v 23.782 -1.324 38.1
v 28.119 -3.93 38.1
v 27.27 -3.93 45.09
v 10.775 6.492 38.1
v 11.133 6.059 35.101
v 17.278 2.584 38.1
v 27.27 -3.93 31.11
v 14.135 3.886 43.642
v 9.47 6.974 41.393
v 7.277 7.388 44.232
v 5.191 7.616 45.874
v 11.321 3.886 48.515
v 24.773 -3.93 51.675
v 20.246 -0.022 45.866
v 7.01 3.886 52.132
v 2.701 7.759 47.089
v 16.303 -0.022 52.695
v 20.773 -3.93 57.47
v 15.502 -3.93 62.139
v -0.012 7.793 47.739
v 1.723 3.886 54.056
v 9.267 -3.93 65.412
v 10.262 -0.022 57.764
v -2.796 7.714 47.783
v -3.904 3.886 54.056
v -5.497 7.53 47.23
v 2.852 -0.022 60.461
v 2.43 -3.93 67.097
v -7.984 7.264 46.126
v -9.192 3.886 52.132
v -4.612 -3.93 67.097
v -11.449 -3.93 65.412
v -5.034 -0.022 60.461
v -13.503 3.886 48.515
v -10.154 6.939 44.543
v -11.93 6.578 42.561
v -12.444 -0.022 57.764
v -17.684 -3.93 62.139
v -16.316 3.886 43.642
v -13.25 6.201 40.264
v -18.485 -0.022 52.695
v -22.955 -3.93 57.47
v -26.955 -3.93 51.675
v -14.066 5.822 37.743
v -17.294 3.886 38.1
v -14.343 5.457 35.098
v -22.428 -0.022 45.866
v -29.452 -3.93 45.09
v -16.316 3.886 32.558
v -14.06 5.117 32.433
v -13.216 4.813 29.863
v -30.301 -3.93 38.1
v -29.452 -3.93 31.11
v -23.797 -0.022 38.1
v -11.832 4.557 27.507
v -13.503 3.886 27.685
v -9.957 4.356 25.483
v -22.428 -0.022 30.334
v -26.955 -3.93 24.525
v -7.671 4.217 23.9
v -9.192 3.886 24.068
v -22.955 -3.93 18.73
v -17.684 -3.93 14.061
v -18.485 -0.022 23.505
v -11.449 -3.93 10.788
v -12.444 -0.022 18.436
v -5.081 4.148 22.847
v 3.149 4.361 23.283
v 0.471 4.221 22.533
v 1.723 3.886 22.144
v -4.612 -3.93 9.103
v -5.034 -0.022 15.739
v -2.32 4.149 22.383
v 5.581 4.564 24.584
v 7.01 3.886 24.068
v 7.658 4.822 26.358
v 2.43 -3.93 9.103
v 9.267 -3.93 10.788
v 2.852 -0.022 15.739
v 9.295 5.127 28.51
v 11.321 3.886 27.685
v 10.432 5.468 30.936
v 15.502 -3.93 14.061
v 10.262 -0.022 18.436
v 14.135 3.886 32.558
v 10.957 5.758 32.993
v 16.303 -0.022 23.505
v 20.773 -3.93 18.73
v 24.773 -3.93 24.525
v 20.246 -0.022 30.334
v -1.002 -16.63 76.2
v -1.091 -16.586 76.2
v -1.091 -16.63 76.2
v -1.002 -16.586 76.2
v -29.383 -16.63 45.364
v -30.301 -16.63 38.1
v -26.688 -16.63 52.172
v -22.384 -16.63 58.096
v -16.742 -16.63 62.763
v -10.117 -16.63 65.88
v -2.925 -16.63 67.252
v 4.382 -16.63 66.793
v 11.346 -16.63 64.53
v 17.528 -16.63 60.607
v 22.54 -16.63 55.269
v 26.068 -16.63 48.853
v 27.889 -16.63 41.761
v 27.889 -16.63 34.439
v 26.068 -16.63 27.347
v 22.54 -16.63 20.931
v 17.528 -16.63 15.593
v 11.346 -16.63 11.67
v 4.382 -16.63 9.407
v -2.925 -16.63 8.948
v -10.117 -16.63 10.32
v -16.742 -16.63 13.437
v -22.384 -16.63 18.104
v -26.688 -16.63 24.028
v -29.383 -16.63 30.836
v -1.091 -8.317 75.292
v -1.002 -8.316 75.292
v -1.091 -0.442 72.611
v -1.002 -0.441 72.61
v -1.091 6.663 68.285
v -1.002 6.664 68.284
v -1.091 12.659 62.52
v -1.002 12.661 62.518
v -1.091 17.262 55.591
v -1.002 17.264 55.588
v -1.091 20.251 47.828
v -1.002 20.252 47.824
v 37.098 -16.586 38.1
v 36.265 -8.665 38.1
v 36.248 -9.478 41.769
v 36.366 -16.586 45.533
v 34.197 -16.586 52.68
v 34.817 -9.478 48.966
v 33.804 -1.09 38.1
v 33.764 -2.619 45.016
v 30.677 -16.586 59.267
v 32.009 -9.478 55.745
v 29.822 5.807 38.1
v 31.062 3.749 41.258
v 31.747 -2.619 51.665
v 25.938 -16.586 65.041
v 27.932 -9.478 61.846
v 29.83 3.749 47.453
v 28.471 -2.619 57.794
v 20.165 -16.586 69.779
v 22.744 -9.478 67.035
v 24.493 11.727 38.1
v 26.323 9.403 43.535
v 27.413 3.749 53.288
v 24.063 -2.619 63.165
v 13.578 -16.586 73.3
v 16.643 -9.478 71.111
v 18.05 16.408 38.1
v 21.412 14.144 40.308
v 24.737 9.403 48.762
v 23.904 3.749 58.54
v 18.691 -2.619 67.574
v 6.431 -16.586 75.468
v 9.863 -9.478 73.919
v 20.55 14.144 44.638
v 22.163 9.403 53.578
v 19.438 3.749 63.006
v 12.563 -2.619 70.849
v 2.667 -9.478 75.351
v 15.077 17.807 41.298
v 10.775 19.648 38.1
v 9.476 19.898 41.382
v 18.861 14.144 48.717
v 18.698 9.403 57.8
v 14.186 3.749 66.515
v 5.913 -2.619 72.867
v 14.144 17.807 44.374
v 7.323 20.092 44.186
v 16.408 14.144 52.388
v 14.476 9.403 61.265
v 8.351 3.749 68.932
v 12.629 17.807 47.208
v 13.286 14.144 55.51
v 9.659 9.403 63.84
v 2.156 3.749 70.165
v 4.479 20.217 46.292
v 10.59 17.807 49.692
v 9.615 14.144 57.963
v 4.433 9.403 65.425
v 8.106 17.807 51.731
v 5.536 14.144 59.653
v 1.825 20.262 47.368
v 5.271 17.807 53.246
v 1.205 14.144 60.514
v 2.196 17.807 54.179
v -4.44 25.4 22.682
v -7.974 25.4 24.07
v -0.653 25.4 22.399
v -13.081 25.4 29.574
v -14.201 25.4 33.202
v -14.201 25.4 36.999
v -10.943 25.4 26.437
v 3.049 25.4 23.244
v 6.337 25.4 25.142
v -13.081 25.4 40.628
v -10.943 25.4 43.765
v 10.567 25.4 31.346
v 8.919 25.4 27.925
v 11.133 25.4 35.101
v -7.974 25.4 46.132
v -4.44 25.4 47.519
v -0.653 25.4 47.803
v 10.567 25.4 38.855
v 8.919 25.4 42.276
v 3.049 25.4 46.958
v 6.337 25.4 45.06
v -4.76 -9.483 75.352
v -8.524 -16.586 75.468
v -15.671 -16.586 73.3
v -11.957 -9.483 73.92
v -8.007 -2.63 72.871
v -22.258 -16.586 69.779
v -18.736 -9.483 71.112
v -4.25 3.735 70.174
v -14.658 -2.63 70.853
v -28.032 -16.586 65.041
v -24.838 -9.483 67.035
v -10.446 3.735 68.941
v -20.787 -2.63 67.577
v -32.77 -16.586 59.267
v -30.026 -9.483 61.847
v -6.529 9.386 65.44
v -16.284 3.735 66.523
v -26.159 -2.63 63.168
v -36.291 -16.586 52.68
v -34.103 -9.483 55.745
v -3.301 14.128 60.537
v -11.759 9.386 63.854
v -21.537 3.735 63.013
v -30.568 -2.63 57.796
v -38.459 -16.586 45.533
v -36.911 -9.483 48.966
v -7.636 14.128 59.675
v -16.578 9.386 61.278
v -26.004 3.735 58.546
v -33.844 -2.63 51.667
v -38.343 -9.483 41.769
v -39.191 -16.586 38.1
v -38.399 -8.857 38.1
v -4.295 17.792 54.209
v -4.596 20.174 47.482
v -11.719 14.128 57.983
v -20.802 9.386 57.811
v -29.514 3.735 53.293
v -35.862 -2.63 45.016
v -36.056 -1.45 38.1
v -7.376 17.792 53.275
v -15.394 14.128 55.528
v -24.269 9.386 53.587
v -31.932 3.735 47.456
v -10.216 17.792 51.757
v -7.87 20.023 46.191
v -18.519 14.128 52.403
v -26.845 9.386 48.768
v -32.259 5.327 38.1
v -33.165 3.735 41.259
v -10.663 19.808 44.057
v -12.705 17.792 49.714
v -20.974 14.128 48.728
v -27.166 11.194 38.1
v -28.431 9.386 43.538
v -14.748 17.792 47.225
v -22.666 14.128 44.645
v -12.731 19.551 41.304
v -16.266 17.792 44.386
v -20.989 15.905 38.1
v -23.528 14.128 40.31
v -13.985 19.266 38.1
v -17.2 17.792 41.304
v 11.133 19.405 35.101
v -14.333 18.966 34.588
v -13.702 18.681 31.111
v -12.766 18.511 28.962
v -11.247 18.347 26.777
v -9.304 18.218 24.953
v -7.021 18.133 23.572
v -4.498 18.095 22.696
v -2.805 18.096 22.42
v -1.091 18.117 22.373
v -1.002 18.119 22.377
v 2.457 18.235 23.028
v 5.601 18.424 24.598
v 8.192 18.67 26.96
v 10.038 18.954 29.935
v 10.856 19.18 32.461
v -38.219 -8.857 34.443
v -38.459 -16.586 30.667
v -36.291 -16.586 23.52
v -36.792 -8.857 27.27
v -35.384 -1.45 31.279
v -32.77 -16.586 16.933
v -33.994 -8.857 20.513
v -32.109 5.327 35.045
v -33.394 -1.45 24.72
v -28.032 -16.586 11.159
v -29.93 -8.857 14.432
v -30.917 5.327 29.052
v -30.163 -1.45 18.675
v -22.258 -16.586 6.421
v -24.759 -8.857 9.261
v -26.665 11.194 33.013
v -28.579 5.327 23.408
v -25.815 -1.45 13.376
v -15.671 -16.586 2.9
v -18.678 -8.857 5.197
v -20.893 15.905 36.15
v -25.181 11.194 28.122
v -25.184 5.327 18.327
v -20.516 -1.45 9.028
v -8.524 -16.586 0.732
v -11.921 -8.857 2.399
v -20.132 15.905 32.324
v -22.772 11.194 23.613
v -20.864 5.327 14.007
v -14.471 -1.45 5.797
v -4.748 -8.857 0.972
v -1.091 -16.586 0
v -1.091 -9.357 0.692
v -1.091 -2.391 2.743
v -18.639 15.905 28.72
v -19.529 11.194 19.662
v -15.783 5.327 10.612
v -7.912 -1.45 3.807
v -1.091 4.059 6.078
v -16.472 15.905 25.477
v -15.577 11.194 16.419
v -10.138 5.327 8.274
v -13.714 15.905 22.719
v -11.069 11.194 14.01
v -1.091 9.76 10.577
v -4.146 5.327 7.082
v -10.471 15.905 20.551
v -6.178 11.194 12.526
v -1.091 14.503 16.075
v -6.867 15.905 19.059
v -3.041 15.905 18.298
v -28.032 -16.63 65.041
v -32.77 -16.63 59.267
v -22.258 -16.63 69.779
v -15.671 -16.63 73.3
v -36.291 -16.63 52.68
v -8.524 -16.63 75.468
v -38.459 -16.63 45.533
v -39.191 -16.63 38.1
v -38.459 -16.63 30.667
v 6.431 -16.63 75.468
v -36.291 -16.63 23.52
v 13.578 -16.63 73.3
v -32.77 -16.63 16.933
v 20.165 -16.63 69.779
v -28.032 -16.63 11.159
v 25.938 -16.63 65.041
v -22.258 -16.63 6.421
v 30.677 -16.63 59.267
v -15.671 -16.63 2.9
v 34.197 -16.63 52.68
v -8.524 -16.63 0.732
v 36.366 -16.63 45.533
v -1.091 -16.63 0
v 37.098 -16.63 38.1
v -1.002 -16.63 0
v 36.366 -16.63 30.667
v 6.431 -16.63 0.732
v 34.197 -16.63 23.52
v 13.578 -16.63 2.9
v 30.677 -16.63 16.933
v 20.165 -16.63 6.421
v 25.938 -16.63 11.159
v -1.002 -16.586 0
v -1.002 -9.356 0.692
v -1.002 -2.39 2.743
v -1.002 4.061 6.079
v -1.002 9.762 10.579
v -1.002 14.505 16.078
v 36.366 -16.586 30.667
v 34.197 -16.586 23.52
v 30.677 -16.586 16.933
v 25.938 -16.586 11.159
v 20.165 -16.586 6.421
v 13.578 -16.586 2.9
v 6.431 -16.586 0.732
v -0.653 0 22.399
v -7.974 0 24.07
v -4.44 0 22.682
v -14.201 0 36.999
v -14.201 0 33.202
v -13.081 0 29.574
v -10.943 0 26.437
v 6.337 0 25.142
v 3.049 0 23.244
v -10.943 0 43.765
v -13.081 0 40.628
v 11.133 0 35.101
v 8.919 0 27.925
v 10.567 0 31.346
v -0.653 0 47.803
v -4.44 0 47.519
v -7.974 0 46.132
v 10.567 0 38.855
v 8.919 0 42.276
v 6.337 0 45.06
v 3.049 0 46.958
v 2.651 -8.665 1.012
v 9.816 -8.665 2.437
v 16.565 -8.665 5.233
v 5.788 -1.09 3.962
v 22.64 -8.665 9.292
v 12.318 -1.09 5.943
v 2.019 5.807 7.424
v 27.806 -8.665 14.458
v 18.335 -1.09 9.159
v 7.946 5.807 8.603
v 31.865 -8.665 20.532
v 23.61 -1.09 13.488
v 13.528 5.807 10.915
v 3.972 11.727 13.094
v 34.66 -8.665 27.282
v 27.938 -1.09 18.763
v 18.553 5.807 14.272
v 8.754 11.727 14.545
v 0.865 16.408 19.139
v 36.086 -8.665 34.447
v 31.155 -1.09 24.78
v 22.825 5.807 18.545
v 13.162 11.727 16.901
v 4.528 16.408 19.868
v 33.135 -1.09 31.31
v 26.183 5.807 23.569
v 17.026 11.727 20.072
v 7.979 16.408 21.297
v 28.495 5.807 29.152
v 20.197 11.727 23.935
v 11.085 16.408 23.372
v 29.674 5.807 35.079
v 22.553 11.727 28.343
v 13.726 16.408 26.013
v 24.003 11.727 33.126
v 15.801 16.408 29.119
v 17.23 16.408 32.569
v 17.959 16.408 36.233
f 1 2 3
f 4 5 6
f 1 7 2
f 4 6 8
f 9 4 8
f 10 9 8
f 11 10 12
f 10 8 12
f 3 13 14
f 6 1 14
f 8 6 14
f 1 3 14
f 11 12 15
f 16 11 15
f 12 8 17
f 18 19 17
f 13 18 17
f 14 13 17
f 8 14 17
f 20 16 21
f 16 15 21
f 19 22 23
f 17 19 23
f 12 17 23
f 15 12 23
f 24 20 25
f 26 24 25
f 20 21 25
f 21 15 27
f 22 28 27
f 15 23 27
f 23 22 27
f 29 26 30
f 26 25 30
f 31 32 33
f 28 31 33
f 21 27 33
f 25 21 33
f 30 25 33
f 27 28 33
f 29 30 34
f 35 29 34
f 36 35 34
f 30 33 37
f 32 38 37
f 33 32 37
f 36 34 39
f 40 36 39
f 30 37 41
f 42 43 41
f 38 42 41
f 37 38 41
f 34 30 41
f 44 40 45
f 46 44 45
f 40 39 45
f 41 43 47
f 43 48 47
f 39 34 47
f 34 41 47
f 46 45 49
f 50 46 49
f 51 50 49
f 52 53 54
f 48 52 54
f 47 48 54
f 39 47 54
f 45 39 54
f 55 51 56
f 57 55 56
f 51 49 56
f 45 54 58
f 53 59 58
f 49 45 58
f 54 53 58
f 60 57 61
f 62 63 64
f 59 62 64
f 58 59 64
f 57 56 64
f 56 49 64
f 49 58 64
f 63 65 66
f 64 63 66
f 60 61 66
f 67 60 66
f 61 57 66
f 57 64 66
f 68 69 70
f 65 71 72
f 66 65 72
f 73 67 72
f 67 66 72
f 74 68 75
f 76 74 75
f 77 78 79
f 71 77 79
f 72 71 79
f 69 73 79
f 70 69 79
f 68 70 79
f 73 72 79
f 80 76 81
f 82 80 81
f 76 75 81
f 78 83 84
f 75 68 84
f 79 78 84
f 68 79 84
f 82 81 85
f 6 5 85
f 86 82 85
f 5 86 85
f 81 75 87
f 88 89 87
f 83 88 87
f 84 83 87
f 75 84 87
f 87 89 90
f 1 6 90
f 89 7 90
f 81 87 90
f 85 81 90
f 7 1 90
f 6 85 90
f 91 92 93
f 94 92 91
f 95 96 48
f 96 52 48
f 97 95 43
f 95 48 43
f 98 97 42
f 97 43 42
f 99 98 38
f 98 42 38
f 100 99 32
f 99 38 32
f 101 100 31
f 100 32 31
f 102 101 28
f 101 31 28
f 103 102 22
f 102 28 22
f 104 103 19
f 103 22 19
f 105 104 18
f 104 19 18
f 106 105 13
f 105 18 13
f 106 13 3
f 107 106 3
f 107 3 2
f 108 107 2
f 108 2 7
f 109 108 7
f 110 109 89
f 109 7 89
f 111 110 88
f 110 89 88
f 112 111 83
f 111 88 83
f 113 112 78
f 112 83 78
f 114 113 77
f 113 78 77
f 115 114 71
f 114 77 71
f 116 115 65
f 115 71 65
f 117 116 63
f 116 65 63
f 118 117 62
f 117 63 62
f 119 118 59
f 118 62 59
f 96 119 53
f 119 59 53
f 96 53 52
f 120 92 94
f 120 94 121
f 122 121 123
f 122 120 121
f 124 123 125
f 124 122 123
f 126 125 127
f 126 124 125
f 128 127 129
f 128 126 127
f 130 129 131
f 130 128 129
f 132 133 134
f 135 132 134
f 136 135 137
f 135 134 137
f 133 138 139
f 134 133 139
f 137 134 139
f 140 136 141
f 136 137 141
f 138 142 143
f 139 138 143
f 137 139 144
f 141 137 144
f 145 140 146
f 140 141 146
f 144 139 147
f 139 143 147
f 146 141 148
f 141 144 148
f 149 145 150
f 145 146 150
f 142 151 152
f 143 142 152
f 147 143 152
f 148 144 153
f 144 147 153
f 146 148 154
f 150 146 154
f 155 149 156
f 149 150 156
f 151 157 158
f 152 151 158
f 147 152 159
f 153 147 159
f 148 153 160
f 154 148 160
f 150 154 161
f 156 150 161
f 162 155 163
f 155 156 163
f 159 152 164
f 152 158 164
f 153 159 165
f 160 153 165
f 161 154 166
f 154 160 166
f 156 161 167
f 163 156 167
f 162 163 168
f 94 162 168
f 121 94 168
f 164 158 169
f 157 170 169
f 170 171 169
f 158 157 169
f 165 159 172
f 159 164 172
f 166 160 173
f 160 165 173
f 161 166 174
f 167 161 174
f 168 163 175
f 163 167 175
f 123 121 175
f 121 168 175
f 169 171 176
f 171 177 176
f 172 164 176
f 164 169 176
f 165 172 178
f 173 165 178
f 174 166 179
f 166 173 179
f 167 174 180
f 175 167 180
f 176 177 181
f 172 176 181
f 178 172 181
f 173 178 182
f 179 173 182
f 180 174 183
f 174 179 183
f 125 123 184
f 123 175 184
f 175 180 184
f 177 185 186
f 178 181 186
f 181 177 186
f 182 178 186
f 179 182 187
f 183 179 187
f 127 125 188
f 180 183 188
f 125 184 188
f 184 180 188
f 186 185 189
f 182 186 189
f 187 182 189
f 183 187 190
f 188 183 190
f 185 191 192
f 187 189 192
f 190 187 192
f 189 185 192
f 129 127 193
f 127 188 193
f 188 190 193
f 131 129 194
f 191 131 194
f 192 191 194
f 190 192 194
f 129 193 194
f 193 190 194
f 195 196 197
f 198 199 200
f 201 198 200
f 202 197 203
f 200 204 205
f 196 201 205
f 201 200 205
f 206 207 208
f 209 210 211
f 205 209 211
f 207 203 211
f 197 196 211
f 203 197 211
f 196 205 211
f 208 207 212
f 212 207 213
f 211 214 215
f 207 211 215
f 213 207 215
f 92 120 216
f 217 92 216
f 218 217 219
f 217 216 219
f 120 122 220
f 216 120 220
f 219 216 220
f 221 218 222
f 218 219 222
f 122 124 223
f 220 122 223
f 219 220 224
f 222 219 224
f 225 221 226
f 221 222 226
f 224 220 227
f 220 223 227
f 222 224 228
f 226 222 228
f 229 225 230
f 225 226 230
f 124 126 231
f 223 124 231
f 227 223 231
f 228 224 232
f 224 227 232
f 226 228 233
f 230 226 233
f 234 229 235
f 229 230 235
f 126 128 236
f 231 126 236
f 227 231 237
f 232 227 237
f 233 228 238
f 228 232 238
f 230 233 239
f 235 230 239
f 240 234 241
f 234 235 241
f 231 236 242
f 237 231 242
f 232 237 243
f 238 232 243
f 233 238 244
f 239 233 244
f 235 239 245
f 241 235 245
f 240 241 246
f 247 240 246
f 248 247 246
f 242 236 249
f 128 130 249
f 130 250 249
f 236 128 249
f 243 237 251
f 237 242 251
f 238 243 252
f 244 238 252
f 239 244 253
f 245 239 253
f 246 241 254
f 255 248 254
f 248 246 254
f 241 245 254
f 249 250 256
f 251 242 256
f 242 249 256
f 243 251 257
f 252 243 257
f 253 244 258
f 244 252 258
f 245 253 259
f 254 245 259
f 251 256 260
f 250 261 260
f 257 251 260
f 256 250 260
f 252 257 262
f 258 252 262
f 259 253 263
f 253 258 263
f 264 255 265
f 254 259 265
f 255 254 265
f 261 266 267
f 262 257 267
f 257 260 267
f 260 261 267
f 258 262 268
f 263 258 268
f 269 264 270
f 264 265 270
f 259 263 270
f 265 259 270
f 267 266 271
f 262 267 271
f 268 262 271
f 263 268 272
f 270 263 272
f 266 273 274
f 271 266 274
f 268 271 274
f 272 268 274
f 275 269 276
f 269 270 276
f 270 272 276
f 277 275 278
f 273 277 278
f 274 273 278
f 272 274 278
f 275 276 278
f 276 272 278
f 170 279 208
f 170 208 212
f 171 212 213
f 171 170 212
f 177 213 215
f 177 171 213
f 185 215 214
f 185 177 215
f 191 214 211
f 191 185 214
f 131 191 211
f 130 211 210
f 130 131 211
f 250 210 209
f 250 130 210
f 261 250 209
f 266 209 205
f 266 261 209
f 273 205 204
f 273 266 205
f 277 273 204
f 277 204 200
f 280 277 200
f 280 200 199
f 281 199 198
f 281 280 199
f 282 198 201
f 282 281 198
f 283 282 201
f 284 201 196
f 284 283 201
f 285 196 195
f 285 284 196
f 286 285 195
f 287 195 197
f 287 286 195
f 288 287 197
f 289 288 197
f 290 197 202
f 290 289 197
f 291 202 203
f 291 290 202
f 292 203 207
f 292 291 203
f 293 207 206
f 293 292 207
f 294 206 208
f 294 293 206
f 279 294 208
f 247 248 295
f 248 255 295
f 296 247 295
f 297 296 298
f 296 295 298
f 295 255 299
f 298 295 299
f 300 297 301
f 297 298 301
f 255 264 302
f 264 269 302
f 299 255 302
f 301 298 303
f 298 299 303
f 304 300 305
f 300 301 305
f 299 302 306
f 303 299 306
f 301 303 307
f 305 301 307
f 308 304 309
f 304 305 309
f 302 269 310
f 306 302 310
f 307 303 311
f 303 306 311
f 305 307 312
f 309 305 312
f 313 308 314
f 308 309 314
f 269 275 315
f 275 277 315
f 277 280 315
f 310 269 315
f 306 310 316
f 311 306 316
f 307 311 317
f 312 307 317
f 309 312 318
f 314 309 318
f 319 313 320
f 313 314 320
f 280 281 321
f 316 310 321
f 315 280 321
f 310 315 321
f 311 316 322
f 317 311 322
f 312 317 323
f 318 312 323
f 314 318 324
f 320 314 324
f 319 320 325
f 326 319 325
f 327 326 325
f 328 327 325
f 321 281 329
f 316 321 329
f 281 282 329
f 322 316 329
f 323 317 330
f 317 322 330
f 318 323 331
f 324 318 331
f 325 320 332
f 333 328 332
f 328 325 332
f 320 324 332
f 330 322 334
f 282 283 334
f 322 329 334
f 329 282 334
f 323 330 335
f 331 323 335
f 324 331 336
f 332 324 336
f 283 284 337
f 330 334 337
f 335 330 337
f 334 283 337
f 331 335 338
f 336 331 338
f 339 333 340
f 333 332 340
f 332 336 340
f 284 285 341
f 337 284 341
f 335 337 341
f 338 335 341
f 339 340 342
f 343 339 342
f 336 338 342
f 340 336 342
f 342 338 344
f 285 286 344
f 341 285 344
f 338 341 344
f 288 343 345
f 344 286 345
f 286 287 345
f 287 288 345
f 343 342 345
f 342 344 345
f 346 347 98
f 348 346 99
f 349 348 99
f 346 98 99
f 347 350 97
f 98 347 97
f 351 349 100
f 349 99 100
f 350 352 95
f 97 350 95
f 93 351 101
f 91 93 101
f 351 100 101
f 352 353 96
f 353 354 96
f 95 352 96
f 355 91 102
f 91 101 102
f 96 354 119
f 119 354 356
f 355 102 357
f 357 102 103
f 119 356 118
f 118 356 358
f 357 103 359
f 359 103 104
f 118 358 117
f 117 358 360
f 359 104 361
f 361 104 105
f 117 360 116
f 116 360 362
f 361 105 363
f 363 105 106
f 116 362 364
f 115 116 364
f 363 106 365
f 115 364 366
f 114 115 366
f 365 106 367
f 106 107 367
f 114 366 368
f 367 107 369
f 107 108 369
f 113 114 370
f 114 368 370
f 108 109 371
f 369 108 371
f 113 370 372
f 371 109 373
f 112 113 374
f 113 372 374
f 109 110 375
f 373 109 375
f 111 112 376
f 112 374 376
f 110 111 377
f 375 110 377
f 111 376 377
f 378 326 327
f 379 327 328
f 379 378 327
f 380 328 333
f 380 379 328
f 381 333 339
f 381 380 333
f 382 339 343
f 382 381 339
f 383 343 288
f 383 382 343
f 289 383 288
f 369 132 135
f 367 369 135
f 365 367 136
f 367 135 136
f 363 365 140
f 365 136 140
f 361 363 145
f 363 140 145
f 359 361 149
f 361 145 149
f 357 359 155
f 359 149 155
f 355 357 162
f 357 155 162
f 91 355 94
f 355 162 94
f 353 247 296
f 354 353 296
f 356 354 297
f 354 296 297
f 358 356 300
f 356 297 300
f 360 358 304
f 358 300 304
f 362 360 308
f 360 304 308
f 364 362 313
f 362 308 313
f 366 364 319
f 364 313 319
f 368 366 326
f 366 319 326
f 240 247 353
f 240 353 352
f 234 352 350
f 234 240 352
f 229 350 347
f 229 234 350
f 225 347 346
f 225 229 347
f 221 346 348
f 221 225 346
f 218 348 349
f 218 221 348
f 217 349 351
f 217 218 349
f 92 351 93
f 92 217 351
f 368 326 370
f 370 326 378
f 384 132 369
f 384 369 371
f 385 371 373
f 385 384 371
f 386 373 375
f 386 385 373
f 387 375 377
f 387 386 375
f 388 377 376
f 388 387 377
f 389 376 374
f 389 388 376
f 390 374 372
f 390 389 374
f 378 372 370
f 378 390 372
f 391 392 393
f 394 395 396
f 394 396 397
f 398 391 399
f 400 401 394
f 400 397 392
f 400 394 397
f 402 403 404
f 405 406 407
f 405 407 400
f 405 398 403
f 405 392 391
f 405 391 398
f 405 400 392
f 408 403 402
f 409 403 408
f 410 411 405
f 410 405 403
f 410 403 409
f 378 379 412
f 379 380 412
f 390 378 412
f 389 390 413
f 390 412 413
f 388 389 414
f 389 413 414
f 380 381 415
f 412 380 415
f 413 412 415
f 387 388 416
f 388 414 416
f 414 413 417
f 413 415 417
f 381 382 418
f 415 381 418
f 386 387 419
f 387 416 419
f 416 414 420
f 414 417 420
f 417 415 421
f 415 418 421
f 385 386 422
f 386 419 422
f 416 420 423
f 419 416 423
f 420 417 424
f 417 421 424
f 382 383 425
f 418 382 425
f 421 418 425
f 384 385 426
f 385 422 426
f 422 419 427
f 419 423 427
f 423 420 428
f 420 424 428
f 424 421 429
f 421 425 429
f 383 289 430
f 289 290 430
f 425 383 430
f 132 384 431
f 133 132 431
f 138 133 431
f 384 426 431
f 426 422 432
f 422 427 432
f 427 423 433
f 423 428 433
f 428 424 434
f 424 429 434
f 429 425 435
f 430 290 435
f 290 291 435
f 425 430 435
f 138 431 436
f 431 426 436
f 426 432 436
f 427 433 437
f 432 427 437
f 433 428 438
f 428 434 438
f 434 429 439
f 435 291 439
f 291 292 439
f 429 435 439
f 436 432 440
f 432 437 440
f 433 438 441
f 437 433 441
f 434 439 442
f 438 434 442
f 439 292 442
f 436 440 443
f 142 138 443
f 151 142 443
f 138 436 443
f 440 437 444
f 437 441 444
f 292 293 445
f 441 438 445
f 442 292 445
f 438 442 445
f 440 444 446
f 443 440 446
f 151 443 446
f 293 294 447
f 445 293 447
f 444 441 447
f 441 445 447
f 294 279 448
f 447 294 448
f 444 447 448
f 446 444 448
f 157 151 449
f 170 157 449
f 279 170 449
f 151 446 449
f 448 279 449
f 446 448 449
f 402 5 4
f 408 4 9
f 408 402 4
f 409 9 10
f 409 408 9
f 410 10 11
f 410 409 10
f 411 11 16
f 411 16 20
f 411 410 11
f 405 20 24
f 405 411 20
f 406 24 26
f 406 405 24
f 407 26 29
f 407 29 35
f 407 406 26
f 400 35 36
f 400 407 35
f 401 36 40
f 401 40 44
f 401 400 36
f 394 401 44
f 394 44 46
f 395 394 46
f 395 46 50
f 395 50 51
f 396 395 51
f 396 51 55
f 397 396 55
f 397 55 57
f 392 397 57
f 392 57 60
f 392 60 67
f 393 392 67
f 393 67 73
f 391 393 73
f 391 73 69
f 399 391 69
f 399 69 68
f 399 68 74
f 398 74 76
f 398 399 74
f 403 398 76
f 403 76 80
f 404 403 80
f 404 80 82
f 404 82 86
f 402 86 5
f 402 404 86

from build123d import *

# Parameters (mm, degrees)
F0_W     = 76.2886069715
F0_H     = 38.1443016231
F1_DEPTH = 76.2
F2_R     = 38.09999
F4_D     = 58.42
F4_DEPTH = 12.7
F4_TIP   = 17.5511386818
F5_R     = 38.09999
F6_R     = 12.7378189323
F7_DEPTH = 25.4


# Not quite as in the source:
# - a fillet or chamfer is up to 0.001 mm smaller than in the source, because OpenCascade refuses the exact size


with BuildPart() as f1:
    # F0 (on Top) → F1 (new body)
    with BuildSketch(Plane.XY):
        with Locations((-1.0466407984, 2.4421662092)):
            Rectangle(F0_W, F0_H)
    extrude(amount=F1_DEPTH)

    # F2 (radius 38.1 in the source; OpenCascade refuses exactly that, so slightly less here)
    f2_edges = [f1.edges().sort_by_distance(p)[0] for p in [
        (-39.190944, 2.442166, 76.2),
        (-39.190944, 2.442166, 0),
        (37.097663, 2.442166, 76.2),
        (37.097663, 2.442166, 0),
    ]]
    fillet(f2_edges, radius=F2_R)

    # F4
    with Locations(Plane.XZ.offset(16.6299846023)):
        with Locations((-1.0909442842, 38.1)):
            Hole(F4_D / 2, depth=F4_DEPTH)
            with Locations((0, 0, -(F4_DEPTH + F4_TIP / 2))):  # 118° drill point
                Cone(0, F4_D / 2, F4_TIP, mode=Mode.SUBTRACT)

    # F5 (radius 38.1 in the source; OpenCascade refuses exactly that, so slightly less here)
    f5_edges = [f1.edges().sort_by_distance(p)[0] for p in [
        (-28.031716, 21.514317, 11.159229),
        (25.938434, 21.514317, 11.159229),
    ]]
    fillet(f5_edges, radius=F5_R)

    # F6 (on Front) → F7 (join)
    with BuildSketch(Plane.XZ):
        with Locations((-1.6050767154, 35.1008698344)):
            Circle(F6_R)
    extrude(amount=-F7_DEPTH)


solid = f1.part
